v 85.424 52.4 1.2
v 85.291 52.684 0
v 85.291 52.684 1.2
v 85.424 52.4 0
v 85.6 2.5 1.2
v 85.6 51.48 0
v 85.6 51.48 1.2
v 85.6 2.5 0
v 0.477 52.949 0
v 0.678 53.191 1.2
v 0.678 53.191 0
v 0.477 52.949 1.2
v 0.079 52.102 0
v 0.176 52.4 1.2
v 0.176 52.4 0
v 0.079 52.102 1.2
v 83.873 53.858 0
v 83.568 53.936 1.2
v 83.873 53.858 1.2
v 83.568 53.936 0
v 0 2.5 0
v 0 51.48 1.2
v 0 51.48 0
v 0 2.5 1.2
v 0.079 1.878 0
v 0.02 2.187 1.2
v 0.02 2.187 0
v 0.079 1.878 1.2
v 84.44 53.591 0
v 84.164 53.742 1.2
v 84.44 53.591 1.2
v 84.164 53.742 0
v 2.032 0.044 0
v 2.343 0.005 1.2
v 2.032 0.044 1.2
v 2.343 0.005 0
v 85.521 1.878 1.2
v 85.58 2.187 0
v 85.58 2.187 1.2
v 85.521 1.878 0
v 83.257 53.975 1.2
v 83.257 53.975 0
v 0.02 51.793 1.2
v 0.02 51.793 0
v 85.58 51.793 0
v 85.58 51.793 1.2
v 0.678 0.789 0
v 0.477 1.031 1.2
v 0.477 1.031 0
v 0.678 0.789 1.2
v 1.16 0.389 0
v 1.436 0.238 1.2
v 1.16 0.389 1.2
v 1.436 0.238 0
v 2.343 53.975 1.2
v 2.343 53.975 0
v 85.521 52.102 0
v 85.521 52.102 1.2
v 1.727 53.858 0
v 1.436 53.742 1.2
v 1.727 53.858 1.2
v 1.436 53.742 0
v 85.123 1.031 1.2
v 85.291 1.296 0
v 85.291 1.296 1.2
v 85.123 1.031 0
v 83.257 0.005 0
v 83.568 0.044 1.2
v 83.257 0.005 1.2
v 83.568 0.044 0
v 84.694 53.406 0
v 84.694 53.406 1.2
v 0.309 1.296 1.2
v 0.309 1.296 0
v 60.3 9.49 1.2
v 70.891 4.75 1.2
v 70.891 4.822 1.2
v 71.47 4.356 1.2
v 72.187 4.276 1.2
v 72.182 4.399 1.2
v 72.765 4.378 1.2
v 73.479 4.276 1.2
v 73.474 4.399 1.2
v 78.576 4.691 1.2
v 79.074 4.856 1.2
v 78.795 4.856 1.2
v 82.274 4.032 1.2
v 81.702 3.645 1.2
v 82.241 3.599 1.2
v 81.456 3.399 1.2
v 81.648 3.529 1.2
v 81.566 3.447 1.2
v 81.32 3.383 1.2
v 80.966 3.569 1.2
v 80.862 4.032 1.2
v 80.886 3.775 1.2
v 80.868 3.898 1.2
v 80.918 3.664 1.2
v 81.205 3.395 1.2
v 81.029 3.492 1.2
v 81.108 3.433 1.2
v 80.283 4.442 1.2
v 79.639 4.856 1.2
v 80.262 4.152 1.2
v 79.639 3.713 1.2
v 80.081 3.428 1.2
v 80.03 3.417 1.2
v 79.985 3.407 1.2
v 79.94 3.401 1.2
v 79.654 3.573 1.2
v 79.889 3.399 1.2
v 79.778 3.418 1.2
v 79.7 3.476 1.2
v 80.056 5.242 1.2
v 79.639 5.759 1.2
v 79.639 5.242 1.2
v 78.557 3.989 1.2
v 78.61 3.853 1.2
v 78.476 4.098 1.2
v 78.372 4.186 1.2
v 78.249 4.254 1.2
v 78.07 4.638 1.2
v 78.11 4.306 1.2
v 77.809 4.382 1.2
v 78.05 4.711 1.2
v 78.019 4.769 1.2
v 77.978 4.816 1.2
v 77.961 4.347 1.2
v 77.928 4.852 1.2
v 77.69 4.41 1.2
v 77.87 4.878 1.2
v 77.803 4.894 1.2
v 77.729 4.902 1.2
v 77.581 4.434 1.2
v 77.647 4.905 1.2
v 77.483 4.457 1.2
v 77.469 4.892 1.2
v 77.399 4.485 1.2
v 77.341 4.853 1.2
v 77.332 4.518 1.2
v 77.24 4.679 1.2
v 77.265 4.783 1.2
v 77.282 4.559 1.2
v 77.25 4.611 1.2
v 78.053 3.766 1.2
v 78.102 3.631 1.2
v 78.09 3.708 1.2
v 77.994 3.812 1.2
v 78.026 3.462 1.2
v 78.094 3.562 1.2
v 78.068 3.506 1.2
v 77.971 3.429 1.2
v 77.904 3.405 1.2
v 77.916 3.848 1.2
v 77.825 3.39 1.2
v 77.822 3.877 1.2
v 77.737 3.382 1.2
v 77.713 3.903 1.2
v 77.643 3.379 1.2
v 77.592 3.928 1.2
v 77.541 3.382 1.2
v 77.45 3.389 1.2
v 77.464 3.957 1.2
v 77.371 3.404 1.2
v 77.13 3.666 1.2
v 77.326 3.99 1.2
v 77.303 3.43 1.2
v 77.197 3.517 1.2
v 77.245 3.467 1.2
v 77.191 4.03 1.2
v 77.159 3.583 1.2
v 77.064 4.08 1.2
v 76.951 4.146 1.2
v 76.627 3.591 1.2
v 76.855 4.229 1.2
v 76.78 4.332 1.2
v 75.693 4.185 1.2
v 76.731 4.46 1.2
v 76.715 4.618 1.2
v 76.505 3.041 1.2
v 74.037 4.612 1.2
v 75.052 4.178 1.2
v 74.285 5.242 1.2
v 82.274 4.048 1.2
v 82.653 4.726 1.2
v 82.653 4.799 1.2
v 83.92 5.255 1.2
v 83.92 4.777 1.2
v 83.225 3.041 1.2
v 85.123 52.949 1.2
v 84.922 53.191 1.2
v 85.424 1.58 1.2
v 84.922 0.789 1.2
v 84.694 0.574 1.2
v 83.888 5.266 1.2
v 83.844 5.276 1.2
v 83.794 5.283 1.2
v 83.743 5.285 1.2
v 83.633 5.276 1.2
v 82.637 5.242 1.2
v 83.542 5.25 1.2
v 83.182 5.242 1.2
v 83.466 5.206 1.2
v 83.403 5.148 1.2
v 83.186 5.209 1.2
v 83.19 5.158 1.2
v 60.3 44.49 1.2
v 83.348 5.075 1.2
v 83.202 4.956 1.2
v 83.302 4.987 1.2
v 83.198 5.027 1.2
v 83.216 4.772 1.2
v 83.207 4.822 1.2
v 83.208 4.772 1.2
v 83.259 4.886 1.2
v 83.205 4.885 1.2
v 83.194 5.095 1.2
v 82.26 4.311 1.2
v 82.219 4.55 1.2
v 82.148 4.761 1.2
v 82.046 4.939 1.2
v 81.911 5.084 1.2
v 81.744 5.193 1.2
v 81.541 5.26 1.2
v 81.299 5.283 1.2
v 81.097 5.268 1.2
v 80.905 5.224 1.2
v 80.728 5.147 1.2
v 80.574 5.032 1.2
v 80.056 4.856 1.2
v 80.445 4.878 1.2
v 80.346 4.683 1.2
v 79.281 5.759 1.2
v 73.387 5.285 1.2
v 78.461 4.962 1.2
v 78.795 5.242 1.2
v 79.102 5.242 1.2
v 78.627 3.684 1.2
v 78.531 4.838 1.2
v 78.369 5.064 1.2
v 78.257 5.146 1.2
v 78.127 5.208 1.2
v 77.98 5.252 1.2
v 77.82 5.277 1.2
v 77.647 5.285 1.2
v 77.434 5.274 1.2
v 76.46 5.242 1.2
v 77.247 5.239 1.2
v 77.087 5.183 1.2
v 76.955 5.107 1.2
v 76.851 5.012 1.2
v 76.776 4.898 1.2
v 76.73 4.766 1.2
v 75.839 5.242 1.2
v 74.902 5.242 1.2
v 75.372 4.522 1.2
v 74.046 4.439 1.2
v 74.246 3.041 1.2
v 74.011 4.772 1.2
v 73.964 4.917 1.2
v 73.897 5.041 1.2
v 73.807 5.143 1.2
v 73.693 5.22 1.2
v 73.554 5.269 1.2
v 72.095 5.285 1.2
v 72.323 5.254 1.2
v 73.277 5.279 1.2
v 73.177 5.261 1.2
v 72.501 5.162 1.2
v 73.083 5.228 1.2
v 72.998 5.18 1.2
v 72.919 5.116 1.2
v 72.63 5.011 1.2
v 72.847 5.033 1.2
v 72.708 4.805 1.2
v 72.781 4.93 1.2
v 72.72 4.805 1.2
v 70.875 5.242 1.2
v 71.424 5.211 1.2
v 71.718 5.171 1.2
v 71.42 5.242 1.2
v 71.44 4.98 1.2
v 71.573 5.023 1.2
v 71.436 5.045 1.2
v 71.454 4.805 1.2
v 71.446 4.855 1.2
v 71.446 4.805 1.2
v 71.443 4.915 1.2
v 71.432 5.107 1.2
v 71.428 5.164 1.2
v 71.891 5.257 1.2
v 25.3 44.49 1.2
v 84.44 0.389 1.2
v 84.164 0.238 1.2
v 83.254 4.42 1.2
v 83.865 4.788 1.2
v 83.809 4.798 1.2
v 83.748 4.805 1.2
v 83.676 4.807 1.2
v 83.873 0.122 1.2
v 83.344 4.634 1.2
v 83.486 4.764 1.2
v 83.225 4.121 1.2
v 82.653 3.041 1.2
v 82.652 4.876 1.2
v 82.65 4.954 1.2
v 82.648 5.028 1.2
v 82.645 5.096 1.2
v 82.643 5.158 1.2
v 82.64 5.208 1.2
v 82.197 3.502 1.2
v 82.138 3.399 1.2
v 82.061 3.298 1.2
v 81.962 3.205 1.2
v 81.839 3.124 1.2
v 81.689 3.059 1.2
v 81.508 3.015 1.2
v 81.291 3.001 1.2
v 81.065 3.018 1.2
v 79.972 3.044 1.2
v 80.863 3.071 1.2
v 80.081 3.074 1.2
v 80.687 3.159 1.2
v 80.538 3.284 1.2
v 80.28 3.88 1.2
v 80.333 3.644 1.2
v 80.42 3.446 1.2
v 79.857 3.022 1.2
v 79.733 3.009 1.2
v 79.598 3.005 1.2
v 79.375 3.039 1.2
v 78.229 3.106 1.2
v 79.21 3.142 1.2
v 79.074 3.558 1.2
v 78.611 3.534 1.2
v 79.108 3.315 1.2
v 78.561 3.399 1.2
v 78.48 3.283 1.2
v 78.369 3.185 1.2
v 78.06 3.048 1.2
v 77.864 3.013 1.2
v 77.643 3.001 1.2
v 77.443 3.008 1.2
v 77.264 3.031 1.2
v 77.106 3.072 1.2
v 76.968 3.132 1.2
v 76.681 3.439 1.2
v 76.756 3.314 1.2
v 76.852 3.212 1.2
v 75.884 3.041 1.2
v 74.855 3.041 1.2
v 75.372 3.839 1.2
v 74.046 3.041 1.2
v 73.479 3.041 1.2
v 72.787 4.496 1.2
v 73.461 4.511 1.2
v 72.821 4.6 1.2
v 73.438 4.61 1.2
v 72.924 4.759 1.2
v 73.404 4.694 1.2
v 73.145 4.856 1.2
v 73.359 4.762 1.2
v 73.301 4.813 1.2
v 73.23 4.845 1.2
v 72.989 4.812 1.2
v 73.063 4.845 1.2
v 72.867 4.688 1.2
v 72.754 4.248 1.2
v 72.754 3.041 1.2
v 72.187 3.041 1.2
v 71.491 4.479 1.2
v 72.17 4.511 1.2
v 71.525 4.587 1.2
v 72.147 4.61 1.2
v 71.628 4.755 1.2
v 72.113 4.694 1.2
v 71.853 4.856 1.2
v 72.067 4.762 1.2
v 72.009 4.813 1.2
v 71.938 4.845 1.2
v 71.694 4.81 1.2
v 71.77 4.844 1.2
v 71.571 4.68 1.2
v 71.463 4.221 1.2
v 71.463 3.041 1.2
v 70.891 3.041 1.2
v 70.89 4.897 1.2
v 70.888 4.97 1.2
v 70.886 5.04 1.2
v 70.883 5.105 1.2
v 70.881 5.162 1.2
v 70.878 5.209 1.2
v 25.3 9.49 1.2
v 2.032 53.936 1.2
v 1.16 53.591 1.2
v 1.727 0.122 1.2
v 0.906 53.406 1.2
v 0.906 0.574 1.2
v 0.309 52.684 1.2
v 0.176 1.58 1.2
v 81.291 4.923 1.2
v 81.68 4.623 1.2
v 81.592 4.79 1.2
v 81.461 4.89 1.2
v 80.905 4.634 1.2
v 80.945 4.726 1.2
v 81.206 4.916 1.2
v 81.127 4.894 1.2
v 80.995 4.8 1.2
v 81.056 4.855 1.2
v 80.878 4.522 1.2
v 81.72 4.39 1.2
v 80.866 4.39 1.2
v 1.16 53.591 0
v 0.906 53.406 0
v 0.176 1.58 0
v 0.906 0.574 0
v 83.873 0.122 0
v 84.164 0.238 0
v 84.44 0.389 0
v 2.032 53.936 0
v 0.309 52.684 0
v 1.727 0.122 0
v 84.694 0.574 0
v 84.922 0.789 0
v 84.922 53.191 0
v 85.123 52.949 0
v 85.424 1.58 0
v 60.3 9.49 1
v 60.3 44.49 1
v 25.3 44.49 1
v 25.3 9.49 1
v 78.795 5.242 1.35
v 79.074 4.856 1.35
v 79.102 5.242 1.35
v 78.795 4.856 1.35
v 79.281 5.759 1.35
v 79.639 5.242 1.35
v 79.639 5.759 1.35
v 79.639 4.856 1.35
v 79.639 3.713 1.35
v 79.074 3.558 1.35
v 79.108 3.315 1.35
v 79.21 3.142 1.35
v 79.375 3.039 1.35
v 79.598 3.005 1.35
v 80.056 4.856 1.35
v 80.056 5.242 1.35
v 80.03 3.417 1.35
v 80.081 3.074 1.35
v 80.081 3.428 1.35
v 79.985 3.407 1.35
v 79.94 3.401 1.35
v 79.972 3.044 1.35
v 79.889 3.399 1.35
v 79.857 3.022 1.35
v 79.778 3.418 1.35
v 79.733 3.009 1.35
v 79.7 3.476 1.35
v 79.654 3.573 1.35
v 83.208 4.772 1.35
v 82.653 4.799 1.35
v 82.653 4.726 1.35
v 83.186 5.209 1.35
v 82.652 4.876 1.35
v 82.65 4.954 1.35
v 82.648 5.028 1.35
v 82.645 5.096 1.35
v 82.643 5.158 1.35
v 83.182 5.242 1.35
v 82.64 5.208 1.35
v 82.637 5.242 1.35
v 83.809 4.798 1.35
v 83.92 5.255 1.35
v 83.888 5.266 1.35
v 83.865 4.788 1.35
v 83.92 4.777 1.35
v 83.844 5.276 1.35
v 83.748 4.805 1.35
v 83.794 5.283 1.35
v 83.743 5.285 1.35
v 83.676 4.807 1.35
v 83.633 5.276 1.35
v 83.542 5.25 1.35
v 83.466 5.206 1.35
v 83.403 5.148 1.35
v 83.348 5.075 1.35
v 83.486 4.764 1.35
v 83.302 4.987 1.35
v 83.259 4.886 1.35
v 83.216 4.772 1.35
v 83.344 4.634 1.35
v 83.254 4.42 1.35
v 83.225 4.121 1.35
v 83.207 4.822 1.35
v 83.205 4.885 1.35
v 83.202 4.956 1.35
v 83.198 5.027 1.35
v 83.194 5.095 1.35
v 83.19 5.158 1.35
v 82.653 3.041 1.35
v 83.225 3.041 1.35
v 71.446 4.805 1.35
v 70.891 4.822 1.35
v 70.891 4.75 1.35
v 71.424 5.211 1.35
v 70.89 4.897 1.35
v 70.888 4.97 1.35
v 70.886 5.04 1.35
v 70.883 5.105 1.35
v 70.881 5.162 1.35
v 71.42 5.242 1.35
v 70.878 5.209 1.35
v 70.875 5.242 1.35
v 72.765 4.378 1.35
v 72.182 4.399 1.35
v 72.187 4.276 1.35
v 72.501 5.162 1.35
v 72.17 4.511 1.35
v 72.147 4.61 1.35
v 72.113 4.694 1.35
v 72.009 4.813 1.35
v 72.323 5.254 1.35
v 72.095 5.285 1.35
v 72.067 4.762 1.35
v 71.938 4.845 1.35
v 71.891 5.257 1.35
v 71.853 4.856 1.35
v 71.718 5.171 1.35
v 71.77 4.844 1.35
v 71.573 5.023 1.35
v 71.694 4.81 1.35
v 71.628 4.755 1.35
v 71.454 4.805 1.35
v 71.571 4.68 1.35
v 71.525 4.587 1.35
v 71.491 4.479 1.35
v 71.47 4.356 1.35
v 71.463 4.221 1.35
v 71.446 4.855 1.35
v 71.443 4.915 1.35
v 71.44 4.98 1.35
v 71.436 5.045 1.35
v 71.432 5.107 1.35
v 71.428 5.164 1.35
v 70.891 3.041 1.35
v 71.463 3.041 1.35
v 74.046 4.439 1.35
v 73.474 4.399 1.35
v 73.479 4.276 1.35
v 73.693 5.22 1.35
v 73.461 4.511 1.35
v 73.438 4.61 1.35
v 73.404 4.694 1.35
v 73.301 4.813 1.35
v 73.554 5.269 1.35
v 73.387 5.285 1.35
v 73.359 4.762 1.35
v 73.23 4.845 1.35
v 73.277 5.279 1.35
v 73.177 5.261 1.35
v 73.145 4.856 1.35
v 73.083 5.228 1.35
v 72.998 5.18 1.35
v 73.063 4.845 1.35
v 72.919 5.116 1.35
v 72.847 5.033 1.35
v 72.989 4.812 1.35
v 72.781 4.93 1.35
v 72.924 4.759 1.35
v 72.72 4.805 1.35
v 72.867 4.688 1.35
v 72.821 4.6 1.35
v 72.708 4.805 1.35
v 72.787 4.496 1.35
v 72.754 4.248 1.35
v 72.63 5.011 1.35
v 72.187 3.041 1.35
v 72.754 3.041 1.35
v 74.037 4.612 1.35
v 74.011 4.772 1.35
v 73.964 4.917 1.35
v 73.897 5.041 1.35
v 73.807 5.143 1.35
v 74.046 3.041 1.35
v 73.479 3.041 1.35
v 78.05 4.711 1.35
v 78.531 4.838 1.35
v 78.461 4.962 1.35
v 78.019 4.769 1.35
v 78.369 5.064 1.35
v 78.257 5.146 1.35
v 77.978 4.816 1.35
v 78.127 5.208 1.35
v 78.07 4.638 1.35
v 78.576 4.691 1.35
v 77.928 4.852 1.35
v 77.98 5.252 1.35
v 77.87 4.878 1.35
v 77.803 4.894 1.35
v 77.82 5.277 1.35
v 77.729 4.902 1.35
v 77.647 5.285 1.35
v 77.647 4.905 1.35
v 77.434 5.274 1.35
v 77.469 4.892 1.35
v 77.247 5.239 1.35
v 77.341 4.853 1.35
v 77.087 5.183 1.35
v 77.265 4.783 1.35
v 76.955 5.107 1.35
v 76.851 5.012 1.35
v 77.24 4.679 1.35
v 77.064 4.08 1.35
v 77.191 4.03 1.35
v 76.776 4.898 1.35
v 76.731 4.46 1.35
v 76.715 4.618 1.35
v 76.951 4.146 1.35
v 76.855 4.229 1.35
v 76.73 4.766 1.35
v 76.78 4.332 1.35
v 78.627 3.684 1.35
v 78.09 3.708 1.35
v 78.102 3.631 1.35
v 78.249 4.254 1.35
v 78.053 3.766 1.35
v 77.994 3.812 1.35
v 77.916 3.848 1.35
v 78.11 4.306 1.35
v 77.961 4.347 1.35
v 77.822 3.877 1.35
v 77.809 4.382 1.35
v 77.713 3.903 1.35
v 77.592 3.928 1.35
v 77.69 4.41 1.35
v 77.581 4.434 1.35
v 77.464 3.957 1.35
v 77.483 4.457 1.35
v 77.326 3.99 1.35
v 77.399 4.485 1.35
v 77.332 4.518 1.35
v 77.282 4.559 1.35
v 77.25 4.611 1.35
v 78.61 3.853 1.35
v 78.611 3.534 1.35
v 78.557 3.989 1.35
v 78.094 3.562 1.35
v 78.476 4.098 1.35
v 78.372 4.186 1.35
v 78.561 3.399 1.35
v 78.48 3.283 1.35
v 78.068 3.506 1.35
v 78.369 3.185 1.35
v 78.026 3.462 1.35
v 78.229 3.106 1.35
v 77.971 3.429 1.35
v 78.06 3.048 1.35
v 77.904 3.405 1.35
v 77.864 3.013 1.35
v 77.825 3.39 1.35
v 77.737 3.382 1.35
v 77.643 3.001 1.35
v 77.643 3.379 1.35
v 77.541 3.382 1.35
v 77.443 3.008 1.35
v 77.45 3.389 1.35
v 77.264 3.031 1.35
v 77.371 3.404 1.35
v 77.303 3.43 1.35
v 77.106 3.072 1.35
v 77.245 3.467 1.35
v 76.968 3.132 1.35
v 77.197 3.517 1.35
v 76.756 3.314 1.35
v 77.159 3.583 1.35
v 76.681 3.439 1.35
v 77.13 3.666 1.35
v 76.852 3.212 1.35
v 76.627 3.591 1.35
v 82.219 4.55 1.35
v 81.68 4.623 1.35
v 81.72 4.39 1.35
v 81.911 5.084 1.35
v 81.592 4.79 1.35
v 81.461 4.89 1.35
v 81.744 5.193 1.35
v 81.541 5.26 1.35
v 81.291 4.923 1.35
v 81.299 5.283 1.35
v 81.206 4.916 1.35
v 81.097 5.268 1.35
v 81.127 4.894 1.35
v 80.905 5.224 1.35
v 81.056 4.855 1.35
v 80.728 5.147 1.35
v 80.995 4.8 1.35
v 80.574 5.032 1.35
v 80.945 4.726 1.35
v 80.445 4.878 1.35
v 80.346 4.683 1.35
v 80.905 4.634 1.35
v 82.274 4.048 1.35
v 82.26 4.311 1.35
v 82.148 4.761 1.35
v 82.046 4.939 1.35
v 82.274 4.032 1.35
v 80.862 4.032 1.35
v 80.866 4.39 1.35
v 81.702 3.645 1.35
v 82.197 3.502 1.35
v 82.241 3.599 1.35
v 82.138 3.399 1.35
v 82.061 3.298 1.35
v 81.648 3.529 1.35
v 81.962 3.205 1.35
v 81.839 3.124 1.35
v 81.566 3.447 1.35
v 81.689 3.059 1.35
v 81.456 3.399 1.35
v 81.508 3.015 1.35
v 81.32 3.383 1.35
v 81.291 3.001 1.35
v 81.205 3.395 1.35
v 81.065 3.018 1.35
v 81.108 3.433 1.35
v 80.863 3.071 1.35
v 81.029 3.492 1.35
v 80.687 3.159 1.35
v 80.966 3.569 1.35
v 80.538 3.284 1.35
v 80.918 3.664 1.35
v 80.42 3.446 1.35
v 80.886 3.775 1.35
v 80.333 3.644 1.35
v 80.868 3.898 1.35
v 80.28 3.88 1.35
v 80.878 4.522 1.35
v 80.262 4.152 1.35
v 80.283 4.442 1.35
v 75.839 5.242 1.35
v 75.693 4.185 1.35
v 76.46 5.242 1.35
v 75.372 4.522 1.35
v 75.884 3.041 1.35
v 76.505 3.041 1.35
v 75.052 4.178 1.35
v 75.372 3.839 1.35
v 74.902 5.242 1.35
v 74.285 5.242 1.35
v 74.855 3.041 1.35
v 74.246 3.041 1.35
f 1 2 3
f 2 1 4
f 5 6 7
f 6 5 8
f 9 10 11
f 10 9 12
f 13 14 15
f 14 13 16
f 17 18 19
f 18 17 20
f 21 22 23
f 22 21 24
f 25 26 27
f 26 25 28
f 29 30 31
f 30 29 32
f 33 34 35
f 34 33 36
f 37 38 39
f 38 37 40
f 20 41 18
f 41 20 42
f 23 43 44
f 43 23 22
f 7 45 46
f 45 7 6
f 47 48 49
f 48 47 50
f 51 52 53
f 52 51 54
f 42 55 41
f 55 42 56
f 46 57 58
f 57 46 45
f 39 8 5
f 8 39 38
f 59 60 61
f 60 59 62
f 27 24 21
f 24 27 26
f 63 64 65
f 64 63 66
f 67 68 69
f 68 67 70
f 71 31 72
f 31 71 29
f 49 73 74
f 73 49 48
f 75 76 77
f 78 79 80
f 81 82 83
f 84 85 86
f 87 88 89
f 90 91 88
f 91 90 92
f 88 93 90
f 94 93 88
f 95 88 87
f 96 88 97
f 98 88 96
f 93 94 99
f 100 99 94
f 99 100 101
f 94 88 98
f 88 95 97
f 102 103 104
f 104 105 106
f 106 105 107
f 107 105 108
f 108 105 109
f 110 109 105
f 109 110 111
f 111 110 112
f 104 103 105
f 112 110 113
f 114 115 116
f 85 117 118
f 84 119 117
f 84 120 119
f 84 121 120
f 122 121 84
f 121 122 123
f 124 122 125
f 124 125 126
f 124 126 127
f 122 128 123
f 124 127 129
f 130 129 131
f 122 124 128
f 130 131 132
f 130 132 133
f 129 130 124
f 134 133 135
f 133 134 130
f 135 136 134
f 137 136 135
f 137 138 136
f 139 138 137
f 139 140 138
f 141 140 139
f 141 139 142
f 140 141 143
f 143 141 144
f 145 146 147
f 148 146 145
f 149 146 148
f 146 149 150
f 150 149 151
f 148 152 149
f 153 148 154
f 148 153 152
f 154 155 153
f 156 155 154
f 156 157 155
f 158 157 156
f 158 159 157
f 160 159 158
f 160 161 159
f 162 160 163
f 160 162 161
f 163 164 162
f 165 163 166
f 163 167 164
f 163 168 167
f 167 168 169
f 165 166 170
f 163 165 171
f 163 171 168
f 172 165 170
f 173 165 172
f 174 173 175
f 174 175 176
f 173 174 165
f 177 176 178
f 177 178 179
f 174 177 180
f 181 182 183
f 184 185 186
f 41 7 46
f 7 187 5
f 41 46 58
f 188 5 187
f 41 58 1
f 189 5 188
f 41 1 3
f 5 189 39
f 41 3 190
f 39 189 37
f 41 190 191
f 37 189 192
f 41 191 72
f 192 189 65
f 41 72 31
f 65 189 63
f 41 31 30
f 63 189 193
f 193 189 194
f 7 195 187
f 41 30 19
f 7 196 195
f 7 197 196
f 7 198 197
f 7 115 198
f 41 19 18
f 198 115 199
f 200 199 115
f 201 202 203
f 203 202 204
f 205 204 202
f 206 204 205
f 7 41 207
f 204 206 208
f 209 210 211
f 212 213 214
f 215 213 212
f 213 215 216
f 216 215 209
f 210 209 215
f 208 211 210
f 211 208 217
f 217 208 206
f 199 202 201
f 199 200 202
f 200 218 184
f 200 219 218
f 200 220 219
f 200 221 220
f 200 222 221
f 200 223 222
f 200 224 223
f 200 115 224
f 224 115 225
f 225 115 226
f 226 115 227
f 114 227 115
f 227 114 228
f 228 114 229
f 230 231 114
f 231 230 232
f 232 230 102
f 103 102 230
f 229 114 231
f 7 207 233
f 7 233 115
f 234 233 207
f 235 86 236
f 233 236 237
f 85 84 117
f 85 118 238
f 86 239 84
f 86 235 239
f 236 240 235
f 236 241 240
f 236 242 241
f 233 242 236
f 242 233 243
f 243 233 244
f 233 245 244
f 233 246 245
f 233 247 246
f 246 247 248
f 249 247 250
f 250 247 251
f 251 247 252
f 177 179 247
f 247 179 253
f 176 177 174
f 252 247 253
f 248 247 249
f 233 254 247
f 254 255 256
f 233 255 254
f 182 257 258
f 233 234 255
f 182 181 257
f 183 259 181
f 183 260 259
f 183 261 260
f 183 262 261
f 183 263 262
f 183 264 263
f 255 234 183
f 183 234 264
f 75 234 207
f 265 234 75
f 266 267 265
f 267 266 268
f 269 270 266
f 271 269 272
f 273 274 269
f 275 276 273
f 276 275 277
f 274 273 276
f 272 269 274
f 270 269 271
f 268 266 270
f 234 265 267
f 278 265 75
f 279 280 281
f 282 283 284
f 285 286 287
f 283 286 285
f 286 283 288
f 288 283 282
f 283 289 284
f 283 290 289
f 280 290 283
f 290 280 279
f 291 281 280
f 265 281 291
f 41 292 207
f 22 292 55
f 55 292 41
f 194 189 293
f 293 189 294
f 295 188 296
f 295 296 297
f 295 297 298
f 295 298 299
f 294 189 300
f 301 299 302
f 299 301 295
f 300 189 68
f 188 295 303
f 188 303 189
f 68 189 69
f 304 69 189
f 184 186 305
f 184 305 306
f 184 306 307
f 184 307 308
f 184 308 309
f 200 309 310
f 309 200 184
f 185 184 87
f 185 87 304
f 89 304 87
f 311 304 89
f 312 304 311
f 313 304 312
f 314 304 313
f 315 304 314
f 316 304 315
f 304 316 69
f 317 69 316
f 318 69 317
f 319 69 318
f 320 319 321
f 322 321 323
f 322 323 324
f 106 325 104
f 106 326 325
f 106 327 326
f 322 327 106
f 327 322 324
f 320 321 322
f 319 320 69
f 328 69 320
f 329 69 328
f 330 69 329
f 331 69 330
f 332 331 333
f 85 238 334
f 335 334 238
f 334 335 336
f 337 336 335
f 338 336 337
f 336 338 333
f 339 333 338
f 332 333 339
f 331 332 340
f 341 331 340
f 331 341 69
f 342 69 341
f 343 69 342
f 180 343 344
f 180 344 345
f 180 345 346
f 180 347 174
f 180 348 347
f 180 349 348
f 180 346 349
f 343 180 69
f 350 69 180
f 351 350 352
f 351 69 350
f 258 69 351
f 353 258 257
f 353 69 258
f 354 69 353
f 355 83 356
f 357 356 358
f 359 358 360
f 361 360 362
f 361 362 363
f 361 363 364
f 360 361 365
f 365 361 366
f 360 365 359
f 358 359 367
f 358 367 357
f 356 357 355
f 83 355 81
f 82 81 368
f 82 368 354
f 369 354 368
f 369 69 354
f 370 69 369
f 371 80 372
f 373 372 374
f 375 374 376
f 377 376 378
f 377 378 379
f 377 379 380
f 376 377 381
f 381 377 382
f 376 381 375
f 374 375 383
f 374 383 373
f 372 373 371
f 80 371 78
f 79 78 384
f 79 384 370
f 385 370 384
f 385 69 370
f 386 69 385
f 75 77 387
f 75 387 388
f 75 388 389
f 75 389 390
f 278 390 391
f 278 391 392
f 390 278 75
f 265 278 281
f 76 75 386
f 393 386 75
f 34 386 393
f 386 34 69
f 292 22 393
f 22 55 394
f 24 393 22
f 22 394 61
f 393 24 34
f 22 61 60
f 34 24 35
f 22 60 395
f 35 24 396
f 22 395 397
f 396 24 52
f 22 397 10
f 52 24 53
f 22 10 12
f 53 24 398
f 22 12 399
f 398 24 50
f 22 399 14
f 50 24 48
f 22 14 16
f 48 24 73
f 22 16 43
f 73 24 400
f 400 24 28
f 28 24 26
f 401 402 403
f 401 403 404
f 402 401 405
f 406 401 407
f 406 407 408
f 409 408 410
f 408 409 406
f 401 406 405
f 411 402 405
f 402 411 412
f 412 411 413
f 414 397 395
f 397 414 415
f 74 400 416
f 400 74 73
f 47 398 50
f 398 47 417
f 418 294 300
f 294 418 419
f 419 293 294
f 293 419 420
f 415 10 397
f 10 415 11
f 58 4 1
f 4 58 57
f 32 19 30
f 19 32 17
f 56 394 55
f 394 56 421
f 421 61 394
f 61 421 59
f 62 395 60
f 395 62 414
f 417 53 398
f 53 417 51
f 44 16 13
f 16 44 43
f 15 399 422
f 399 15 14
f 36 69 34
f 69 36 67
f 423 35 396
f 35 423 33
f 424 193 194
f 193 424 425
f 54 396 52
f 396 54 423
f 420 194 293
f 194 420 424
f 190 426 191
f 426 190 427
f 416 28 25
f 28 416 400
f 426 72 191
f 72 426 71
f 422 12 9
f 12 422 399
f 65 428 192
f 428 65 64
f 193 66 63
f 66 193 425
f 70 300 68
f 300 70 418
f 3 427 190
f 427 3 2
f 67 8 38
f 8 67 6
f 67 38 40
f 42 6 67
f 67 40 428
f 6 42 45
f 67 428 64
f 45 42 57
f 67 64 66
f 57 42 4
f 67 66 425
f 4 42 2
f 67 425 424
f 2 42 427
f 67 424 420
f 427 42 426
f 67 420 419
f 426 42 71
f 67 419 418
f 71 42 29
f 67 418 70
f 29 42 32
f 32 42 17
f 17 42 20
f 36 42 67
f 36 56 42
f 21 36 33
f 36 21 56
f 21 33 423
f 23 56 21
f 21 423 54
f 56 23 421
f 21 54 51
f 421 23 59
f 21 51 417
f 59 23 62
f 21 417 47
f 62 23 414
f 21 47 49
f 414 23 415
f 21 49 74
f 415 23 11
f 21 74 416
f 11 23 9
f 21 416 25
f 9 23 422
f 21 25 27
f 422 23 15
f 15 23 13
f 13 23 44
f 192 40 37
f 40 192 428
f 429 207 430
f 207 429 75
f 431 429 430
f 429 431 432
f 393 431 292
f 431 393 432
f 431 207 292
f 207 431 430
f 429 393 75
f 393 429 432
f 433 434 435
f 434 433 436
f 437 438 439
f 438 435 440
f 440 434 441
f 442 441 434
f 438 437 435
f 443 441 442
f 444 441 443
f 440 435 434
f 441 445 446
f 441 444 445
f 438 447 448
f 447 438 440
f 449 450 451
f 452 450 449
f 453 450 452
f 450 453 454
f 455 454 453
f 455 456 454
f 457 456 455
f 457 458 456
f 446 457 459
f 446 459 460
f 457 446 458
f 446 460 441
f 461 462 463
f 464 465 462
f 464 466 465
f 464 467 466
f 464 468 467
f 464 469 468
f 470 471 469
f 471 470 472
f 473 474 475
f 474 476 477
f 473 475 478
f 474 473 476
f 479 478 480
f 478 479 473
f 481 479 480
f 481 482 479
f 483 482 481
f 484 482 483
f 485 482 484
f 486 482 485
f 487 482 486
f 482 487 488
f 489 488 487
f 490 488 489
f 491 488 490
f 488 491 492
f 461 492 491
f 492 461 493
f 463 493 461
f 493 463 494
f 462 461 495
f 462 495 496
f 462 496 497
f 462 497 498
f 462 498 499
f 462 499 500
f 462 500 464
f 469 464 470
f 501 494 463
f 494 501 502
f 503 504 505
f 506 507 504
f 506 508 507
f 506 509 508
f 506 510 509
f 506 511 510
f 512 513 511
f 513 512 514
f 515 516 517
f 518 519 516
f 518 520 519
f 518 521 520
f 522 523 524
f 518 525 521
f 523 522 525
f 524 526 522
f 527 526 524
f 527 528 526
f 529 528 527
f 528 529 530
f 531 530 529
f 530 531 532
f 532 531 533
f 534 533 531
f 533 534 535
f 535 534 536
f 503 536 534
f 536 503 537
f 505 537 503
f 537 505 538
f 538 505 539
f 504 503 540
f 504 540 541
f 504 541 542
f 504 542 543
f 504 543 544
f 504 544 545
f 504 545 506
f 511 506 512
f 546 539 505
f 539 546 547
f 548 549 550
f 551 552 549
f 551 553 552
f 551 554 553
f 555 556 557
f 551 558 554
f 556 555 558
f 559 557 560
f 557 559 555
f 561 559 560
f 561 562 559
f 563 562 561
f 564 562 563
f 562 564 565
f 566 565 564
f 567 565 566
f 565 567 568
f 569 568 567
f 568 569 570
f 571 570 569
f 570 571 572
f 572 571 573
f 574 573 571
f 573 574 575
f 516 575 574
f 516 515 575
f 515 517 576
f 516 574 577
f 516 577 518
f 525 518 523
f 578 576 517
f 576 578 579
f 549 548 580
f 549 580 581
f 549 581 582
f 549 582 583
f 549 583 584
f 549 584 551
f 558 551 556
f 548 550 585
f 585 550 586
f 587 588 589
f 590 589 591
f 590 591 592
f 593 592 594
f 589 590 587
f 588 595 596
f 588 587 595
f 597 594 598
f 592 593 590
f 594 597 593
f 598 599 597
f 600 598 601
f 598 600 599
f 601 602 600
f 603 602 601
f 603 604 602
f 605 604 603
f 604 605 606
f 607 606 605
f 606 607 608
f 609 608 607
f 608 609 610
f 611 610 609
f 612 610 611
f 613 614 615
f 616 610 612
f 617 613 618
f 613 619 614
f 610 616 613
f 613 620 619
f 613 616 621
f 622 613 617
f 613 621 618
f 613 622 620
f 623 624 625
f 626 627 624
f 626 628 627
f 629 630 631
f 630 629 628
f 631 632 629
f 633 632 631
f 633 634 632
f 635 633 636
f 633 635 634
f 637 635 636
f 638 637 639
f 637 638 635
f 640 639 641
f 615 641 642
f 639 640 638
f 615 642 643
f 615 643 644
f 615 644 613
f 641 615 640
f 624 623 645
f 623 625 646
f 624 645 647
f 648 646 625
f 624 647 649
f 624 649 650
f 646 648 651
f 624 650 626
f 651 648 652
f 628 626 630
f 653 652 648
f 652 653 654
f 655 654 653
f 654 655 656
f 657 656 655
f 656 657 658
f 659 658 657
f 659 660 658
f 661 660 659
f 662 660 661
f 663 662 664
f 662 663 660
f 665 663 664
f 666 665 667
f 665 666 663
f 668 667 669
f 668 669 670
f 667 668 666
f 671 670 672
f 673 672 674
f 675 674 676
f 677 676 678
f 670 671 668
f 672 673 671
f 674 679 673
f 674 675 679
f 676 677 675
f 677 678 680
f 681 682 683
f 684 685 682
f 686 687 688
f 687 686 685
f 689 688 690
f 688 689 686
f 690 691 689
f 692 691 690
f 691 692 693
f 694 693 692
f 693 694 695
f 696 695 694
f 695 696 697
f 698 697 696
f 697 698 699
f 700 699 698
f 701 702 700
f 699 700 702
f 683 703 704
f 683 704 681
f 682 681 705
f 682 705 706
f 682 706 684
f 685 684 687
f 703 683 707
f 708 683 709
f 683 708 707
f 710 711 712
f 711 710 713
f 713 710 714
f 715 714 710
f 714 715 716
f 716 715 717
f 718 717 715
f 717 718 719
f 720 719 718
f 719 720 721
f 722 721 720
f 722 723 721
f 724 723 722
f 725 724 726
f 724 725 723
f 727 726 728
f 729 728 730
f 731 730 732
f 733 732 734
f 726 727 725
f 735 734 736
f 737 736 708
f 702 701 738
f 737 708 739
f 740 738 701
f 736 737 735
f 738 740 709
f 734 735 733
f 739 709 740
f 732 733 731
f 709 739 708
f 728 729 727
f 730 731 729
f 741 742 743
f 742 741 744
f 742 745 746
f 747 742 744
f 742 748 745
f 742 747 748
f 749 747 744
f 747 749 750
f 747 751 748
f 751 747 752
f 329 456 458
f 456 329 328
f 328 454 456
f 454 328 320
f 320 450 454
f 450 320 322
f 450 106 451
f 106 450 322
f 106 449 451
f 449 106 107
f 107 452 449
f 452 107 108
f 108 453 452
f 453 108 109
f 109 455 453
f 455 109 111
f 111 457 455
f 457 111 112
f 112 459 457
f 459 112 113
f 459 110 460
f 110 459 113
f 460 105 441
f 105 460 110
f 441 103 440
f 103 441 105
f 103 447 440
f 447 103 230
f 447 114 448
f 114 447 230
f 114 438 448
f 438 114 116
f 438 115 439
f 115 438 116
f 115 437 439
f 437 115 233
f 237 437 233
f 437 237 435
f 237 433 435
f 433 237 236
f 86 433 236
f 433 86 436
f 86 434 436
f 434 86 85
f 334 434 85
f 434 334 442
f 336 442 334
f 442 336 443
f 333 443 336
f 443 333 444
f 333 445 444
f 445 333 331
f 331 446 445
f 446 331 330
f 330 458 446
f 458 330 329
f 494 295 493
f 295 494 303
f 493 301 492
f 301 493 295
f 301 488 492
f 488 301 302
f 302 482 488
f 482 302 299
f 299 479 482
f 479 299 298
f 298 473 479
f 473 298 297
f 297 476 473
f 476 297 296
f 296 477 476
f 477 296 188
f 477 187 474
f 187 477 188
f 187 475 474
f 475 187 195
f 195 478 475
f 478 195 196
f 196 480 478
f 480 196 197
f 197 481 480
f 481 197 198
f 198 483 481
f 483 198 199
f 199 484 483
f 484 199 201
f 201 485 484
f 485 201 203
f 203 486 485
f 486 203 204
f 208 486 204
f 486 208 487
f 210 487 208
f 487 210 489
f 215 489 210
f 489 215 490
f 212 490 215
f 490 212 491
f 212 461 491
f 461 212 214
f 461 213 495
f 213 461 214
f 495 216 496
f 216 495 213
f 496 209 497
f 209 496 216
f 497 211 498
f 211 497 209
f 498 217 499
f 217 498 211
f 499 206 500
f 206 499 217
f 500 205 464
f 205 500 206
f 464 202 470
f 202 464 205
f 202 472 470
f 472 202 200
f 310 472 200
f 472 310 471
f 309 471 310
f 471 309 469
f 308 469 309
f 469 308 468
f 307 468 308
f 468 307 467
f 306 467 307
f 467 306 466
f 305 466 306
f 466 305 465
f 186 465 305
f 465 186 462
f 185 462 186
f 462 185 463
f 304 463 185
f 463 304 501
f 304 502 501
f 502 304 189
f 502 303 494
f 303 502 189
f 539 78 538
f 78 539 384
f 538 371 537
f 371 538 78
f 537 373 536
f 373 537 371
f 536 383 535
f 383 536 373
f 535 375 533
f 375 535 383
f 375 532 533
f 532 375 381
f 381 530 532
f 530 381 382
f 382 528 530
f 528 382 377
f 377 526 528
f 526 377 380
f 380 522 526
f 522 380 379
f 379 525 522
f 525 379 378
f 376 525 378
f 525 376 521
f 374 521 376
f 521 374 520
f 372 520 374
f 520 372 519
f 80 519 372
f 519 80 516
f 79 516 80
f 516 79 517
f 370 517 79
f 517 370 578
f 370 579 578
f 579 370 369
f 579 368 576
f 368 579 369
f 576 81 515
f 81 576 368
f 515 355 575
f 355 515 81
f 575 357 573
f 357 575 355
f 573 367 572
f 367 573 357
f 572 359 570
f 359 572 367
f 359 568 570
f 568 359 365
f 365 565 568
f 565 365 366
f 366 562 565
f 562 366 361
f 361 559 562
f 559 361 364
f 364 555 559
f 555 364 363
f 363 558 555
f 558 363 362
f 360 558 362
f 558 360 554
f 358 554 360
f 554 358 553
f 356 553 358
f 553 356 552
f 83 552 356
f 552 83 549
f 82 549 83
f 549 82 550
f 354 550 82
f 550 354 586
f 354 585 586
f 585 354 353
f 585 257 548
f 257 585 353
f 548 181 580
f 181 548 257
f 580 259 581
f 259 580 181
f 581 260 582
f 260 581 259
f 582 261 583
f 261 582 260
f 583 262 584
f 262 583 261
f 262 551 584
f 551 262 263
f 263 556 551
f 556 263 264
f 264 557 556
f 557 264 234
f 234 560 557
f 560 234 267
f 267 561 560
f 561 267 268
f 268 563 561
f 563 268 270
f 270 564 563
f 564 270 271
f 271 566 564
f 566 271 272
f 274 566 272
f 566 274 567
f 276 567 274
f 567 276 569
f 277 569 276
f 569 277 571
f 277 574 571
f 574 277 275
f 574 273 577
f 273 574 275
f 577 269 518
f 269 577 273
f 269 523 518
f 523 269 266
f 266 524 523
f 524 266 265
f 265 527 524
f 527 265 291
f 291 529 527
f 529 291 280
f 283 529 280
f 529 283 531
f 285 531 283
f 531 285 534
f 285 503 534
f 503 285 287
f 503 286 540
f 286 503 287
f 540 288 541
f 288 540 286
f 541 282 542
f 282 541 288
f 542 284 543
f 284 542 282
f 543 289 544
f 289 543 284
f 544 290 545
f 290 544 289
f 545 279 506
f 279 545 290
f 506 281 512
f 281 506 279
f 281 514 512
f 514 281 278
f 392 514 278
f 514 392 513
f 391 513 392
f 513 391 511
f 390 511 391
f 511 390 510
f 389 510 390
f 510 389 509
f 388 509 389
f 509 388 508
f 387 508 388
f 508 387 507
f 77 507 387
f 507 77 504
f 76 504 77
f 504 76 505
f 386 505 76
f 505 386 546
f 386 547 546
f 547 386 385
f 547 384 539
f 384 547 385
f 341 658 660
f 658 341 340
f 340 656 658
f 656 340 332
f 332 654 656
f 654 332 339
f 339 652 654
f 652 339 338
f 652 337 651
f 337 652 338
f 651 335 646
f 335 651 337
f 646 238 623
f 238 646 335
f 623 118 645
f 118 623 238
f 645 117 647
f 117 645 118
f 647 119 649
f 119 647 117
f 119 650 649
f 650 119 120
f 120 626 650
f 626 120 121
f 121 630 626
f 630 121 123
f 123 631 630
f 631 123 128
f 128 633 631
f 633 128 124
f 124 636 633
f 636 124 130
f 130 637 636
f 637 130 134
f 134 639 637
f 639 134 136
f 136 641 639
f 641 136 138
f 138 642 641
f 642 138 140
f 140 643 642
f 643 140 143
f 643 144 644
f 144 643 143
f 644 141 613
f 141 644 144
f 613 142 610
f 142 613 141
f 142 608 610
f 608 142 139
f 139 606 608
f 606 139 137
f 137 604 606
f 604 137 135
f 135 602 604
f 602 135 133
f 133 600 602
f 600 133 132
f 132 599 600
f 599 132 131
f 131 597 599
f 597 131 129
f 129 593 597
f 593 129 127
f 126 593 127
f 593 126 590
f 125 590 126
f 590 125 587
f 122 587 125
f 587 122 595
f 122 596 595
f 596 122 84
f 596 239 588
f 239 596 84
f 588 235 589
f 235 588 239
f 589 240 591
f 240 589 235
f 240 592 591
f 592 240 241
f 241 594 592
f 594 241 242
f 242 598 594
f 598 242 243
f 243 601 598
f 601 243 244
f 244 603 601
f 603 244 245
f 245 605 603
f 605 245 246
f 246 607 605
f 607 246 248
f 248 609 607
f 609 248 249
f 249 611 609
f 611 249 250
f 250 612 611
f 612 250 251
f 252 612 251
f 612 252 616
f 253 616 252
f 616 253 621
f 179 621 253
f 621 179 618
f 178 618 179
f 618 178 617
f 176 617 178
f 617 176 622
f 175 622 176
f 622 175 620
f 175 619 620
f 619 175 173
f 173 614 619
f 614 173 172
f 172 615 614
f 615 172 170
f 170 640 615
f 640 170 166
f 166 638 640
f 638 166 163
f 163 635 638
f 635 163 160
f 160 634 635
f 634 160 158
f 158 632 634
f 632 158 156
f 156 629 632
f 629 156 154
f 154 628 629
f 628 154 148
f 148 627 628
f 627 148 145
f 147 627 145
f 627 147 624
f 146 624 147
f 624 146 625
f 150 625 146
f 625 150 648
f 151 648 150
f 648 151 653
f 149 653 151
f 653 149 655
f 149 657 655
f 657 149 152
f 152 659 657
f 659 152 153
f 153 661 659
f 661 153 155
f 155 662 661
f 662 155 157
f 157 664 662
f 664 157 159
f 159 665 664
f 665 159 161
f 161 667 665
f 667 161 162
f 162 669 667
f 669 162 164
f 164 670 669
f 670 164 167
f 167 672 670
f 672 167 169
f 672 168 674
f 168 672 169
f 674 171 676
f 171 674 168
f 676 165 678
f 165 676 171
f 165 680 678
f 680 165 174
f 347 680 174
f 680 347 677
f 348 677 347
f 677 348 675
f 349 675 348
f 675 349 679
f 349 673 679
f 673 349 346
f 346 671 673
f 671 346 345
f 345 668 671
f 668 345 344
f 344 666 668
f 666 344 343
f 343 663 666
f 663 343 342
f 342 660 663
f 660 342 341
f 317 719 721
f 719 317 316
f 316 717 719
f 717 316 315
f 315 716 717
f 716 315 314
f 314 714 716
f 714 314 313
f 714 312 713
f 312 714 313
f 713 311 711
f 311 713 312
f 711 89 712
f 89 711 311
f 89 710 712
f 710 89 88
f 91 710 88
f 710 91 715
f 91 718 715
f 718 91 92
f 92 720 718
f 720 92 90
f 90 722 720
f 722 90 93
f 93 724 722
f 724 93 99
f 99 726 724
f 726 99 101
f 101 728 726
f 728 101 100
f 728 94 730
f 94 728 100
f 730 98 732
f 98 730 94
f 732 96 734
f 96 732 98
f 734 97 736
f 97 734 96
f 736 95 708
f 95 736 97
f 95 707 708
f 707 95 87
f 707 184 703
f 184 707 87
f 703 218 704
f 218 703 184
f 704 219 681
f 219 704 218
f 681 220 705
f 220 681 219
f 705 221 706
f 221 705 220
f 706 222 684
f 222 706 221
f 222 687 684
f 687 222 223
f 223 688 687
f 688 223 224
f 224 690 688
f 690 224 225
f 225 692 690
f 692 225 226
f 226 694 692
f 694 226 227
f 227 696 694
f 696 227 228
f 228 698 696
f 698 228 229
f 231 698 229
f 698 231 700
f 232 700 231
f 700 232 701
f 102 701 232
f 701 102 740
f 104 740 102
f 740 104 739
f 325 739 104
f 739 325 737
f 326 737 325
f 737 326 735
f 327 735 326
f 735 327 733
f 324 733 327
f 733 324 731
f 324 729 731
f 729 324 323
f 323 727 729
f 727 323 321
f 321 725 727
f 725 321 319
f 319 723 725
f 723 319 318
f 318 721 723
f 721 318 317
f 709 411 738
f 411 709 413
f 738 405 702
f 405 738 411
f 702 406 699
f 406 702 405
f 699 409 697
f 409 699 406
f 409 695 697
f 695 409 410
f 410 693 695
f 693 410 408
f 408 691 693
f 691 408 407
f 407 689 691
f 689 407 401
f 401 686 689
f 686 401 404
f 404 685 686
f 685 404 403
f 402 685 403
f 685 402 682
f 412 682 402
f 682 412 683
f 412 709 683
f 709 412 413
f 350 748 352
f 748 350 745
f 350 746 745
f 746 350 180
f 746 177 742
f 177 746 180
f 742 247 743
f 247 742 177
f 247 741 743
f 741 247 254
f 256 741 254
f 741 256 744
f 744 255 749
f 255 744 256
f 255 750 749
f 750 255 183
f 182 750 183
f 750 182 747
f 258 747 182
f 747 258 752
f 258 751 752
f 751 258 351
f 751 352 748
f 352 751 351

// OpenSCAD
// mxster Game Card - 3D Model Template
// Credit Card Size: 85.6mm x 53.98mm
// OpenSCAD parametric template for music game cards

// ========================================
// PARAMETERS (Set by generator script)
// ========================================

// Card dimensions (ISO/IEC 7810 standard - credit card size)
card_length = 85.6;
card_width = 53.98;
card_height = 1.2; // Slightly thicker than credit card for durability
corner_radius = 2.5;

// Text content
song_year = "1975";
song_title = "Bohemian Rhapsody";
song_artist = "Queen";

// QR Code settings
qr_code_image = "qr-codes/default.png"; // Path to QR code PNG
qr_code_size = 35; // Size of QR code in mm
qr_code_depth = 0.4; // Depth of engraved QR code

// Text settings
text_height = 0.25; // Height of embossed text
year_font_size = 18;
title_font_size = 9;  // Vergrößert von 7 auf 9 (entspricht PDF: 11→13)
artist_font_size = 8; // Vergrößert von 6 auf 8 (entspricht PDF: 9→11)
font_name = "Liberation Sans:style=Bold";

// ========================================
// MODULES
// ========================================

// Rounded rectangle module
module rounded_rect(length, width, height, radius) {
    hull() {
        translate([radius, radius, 0])
            cylinder(h=height, r=radius, $fn=50);
        translate([length-radius, radius, 0])
            cylinder(h=height, r=radius, $fn=50);
        translate([radius, width-radius, 0])
            cylinder(h=height, r=radius, $fn=50);
        translate([length-radius, width-radius, 0])
            cylinder(h=height, r=radius, $fn=50);
    }
}

// Base card body
module card_base() {
    rounded_rect(card_length, card_width, card_height, corner_radius);
}

// QR Code engraving (front side)
module qr_code_engraving() {
    translate([card_length/2, card_width/2, card_height - qr_code_depth/2]) {
        // QR code as engraved surface
        // Note: In OpenSCAD, you'd use surface() for image-based engraving
        // For now, we create a placeholder rectangular depression
        translate([-qr_code_size/2, -qr_code_size/2, 0])
            cube([qr_code_size, qr_code_size, qr_code_depth + 0.1]);

        // Alternative: If using surface() with heightmap
        // scale([qr_code_size/100, qr_code_size/100, qr_code_depth])
        //     surface(file = qr_code_image, center = true, invert = true);
    }
}

// Embossed text (back side)
module embossed_year() {
    translate([card_length/2, card_width * 0.65, card_height]) {
        linear_extrude(height = text_height) {
            text(song_year,
                 size = year_font_size,
                 font = font_name,
                 halign = "center",
                 valign = "center");
        }
    }
}

module embossed_title() {
    translate([card_length/2, card_width * 0.40, card_height]) {
        linear_extrude(height = text_height) {
            text(song_title,
                 size = title_font_size,
                 font = font_name,
                 halign = "center",
                 valign = "center");
        }
    }
}

module embossed_artist() {
    translate([card_length/2, card_width * 0.25, card_height]) {
        linear_extrude(height = text_height) {
            text(song_artist,
                 size = artist_font_size,
                 font = font_name,
                 halign = "center",
                 valign = "center");
        }
    }
}

// Small logo/watermark
module watermark() {
    translate([card_length - 15, 3, card_height]) {
        linear_extrude(height = 0.15) {
            text("mxster",
                 size = 3,
                 font = "Liberation Sans:style=Bold",
                 halign = "left",
                 valign = "bottom");
        }
    }
}

// ========================================
// MAIN ASSEMBLY
// ========================================

// Choose which side to render
render_front = true; // Set to true for QR code side, false for text side
dual_sided = false; // Set to true to see both sides (for preview only)

if (dual_sided) {
    // Preview mode: Show both sides
    color("white") card_base();
    color("blue", 0.7) qr_code_engraving();
    color("red") embossed_year();
    color("red") embossed_title();
    color("red") embossed_artist();
    color("gray") watermark();
} else if (render_front) {
    // Front side (QR code)
    difference() {
        card_base();
        qr_code_engraving();
    }
    watermark();
} else {
    // Back side (text)
    union() {
        card_base();
        embossed_year();
        embossed_title();
        embossed_artist();
    }
}

// ========================================
// USAGE NOTES
// ========================================

/*
To generate a card:
1. Set parameters at the top of this file
2. Render front side: render_front = true
3. Export to STL: File → Export → Export as STL
4. Render back side: render_front = false
5. Export back side STL
6. Print both sides and glue together, or use dual-extrusion printer

For advanced QR code engraving:
- Convert QR code PNG to heightmap (grayscale)
- Use surface() function with the heightmap file
- Adjust depth multiplier for visibility

Recommended print settings:
- Layer height: 0.1-0.2mm
- Infill: 100% for durability
- Supports: Not needed
- Material: PLA or PETG
*/
